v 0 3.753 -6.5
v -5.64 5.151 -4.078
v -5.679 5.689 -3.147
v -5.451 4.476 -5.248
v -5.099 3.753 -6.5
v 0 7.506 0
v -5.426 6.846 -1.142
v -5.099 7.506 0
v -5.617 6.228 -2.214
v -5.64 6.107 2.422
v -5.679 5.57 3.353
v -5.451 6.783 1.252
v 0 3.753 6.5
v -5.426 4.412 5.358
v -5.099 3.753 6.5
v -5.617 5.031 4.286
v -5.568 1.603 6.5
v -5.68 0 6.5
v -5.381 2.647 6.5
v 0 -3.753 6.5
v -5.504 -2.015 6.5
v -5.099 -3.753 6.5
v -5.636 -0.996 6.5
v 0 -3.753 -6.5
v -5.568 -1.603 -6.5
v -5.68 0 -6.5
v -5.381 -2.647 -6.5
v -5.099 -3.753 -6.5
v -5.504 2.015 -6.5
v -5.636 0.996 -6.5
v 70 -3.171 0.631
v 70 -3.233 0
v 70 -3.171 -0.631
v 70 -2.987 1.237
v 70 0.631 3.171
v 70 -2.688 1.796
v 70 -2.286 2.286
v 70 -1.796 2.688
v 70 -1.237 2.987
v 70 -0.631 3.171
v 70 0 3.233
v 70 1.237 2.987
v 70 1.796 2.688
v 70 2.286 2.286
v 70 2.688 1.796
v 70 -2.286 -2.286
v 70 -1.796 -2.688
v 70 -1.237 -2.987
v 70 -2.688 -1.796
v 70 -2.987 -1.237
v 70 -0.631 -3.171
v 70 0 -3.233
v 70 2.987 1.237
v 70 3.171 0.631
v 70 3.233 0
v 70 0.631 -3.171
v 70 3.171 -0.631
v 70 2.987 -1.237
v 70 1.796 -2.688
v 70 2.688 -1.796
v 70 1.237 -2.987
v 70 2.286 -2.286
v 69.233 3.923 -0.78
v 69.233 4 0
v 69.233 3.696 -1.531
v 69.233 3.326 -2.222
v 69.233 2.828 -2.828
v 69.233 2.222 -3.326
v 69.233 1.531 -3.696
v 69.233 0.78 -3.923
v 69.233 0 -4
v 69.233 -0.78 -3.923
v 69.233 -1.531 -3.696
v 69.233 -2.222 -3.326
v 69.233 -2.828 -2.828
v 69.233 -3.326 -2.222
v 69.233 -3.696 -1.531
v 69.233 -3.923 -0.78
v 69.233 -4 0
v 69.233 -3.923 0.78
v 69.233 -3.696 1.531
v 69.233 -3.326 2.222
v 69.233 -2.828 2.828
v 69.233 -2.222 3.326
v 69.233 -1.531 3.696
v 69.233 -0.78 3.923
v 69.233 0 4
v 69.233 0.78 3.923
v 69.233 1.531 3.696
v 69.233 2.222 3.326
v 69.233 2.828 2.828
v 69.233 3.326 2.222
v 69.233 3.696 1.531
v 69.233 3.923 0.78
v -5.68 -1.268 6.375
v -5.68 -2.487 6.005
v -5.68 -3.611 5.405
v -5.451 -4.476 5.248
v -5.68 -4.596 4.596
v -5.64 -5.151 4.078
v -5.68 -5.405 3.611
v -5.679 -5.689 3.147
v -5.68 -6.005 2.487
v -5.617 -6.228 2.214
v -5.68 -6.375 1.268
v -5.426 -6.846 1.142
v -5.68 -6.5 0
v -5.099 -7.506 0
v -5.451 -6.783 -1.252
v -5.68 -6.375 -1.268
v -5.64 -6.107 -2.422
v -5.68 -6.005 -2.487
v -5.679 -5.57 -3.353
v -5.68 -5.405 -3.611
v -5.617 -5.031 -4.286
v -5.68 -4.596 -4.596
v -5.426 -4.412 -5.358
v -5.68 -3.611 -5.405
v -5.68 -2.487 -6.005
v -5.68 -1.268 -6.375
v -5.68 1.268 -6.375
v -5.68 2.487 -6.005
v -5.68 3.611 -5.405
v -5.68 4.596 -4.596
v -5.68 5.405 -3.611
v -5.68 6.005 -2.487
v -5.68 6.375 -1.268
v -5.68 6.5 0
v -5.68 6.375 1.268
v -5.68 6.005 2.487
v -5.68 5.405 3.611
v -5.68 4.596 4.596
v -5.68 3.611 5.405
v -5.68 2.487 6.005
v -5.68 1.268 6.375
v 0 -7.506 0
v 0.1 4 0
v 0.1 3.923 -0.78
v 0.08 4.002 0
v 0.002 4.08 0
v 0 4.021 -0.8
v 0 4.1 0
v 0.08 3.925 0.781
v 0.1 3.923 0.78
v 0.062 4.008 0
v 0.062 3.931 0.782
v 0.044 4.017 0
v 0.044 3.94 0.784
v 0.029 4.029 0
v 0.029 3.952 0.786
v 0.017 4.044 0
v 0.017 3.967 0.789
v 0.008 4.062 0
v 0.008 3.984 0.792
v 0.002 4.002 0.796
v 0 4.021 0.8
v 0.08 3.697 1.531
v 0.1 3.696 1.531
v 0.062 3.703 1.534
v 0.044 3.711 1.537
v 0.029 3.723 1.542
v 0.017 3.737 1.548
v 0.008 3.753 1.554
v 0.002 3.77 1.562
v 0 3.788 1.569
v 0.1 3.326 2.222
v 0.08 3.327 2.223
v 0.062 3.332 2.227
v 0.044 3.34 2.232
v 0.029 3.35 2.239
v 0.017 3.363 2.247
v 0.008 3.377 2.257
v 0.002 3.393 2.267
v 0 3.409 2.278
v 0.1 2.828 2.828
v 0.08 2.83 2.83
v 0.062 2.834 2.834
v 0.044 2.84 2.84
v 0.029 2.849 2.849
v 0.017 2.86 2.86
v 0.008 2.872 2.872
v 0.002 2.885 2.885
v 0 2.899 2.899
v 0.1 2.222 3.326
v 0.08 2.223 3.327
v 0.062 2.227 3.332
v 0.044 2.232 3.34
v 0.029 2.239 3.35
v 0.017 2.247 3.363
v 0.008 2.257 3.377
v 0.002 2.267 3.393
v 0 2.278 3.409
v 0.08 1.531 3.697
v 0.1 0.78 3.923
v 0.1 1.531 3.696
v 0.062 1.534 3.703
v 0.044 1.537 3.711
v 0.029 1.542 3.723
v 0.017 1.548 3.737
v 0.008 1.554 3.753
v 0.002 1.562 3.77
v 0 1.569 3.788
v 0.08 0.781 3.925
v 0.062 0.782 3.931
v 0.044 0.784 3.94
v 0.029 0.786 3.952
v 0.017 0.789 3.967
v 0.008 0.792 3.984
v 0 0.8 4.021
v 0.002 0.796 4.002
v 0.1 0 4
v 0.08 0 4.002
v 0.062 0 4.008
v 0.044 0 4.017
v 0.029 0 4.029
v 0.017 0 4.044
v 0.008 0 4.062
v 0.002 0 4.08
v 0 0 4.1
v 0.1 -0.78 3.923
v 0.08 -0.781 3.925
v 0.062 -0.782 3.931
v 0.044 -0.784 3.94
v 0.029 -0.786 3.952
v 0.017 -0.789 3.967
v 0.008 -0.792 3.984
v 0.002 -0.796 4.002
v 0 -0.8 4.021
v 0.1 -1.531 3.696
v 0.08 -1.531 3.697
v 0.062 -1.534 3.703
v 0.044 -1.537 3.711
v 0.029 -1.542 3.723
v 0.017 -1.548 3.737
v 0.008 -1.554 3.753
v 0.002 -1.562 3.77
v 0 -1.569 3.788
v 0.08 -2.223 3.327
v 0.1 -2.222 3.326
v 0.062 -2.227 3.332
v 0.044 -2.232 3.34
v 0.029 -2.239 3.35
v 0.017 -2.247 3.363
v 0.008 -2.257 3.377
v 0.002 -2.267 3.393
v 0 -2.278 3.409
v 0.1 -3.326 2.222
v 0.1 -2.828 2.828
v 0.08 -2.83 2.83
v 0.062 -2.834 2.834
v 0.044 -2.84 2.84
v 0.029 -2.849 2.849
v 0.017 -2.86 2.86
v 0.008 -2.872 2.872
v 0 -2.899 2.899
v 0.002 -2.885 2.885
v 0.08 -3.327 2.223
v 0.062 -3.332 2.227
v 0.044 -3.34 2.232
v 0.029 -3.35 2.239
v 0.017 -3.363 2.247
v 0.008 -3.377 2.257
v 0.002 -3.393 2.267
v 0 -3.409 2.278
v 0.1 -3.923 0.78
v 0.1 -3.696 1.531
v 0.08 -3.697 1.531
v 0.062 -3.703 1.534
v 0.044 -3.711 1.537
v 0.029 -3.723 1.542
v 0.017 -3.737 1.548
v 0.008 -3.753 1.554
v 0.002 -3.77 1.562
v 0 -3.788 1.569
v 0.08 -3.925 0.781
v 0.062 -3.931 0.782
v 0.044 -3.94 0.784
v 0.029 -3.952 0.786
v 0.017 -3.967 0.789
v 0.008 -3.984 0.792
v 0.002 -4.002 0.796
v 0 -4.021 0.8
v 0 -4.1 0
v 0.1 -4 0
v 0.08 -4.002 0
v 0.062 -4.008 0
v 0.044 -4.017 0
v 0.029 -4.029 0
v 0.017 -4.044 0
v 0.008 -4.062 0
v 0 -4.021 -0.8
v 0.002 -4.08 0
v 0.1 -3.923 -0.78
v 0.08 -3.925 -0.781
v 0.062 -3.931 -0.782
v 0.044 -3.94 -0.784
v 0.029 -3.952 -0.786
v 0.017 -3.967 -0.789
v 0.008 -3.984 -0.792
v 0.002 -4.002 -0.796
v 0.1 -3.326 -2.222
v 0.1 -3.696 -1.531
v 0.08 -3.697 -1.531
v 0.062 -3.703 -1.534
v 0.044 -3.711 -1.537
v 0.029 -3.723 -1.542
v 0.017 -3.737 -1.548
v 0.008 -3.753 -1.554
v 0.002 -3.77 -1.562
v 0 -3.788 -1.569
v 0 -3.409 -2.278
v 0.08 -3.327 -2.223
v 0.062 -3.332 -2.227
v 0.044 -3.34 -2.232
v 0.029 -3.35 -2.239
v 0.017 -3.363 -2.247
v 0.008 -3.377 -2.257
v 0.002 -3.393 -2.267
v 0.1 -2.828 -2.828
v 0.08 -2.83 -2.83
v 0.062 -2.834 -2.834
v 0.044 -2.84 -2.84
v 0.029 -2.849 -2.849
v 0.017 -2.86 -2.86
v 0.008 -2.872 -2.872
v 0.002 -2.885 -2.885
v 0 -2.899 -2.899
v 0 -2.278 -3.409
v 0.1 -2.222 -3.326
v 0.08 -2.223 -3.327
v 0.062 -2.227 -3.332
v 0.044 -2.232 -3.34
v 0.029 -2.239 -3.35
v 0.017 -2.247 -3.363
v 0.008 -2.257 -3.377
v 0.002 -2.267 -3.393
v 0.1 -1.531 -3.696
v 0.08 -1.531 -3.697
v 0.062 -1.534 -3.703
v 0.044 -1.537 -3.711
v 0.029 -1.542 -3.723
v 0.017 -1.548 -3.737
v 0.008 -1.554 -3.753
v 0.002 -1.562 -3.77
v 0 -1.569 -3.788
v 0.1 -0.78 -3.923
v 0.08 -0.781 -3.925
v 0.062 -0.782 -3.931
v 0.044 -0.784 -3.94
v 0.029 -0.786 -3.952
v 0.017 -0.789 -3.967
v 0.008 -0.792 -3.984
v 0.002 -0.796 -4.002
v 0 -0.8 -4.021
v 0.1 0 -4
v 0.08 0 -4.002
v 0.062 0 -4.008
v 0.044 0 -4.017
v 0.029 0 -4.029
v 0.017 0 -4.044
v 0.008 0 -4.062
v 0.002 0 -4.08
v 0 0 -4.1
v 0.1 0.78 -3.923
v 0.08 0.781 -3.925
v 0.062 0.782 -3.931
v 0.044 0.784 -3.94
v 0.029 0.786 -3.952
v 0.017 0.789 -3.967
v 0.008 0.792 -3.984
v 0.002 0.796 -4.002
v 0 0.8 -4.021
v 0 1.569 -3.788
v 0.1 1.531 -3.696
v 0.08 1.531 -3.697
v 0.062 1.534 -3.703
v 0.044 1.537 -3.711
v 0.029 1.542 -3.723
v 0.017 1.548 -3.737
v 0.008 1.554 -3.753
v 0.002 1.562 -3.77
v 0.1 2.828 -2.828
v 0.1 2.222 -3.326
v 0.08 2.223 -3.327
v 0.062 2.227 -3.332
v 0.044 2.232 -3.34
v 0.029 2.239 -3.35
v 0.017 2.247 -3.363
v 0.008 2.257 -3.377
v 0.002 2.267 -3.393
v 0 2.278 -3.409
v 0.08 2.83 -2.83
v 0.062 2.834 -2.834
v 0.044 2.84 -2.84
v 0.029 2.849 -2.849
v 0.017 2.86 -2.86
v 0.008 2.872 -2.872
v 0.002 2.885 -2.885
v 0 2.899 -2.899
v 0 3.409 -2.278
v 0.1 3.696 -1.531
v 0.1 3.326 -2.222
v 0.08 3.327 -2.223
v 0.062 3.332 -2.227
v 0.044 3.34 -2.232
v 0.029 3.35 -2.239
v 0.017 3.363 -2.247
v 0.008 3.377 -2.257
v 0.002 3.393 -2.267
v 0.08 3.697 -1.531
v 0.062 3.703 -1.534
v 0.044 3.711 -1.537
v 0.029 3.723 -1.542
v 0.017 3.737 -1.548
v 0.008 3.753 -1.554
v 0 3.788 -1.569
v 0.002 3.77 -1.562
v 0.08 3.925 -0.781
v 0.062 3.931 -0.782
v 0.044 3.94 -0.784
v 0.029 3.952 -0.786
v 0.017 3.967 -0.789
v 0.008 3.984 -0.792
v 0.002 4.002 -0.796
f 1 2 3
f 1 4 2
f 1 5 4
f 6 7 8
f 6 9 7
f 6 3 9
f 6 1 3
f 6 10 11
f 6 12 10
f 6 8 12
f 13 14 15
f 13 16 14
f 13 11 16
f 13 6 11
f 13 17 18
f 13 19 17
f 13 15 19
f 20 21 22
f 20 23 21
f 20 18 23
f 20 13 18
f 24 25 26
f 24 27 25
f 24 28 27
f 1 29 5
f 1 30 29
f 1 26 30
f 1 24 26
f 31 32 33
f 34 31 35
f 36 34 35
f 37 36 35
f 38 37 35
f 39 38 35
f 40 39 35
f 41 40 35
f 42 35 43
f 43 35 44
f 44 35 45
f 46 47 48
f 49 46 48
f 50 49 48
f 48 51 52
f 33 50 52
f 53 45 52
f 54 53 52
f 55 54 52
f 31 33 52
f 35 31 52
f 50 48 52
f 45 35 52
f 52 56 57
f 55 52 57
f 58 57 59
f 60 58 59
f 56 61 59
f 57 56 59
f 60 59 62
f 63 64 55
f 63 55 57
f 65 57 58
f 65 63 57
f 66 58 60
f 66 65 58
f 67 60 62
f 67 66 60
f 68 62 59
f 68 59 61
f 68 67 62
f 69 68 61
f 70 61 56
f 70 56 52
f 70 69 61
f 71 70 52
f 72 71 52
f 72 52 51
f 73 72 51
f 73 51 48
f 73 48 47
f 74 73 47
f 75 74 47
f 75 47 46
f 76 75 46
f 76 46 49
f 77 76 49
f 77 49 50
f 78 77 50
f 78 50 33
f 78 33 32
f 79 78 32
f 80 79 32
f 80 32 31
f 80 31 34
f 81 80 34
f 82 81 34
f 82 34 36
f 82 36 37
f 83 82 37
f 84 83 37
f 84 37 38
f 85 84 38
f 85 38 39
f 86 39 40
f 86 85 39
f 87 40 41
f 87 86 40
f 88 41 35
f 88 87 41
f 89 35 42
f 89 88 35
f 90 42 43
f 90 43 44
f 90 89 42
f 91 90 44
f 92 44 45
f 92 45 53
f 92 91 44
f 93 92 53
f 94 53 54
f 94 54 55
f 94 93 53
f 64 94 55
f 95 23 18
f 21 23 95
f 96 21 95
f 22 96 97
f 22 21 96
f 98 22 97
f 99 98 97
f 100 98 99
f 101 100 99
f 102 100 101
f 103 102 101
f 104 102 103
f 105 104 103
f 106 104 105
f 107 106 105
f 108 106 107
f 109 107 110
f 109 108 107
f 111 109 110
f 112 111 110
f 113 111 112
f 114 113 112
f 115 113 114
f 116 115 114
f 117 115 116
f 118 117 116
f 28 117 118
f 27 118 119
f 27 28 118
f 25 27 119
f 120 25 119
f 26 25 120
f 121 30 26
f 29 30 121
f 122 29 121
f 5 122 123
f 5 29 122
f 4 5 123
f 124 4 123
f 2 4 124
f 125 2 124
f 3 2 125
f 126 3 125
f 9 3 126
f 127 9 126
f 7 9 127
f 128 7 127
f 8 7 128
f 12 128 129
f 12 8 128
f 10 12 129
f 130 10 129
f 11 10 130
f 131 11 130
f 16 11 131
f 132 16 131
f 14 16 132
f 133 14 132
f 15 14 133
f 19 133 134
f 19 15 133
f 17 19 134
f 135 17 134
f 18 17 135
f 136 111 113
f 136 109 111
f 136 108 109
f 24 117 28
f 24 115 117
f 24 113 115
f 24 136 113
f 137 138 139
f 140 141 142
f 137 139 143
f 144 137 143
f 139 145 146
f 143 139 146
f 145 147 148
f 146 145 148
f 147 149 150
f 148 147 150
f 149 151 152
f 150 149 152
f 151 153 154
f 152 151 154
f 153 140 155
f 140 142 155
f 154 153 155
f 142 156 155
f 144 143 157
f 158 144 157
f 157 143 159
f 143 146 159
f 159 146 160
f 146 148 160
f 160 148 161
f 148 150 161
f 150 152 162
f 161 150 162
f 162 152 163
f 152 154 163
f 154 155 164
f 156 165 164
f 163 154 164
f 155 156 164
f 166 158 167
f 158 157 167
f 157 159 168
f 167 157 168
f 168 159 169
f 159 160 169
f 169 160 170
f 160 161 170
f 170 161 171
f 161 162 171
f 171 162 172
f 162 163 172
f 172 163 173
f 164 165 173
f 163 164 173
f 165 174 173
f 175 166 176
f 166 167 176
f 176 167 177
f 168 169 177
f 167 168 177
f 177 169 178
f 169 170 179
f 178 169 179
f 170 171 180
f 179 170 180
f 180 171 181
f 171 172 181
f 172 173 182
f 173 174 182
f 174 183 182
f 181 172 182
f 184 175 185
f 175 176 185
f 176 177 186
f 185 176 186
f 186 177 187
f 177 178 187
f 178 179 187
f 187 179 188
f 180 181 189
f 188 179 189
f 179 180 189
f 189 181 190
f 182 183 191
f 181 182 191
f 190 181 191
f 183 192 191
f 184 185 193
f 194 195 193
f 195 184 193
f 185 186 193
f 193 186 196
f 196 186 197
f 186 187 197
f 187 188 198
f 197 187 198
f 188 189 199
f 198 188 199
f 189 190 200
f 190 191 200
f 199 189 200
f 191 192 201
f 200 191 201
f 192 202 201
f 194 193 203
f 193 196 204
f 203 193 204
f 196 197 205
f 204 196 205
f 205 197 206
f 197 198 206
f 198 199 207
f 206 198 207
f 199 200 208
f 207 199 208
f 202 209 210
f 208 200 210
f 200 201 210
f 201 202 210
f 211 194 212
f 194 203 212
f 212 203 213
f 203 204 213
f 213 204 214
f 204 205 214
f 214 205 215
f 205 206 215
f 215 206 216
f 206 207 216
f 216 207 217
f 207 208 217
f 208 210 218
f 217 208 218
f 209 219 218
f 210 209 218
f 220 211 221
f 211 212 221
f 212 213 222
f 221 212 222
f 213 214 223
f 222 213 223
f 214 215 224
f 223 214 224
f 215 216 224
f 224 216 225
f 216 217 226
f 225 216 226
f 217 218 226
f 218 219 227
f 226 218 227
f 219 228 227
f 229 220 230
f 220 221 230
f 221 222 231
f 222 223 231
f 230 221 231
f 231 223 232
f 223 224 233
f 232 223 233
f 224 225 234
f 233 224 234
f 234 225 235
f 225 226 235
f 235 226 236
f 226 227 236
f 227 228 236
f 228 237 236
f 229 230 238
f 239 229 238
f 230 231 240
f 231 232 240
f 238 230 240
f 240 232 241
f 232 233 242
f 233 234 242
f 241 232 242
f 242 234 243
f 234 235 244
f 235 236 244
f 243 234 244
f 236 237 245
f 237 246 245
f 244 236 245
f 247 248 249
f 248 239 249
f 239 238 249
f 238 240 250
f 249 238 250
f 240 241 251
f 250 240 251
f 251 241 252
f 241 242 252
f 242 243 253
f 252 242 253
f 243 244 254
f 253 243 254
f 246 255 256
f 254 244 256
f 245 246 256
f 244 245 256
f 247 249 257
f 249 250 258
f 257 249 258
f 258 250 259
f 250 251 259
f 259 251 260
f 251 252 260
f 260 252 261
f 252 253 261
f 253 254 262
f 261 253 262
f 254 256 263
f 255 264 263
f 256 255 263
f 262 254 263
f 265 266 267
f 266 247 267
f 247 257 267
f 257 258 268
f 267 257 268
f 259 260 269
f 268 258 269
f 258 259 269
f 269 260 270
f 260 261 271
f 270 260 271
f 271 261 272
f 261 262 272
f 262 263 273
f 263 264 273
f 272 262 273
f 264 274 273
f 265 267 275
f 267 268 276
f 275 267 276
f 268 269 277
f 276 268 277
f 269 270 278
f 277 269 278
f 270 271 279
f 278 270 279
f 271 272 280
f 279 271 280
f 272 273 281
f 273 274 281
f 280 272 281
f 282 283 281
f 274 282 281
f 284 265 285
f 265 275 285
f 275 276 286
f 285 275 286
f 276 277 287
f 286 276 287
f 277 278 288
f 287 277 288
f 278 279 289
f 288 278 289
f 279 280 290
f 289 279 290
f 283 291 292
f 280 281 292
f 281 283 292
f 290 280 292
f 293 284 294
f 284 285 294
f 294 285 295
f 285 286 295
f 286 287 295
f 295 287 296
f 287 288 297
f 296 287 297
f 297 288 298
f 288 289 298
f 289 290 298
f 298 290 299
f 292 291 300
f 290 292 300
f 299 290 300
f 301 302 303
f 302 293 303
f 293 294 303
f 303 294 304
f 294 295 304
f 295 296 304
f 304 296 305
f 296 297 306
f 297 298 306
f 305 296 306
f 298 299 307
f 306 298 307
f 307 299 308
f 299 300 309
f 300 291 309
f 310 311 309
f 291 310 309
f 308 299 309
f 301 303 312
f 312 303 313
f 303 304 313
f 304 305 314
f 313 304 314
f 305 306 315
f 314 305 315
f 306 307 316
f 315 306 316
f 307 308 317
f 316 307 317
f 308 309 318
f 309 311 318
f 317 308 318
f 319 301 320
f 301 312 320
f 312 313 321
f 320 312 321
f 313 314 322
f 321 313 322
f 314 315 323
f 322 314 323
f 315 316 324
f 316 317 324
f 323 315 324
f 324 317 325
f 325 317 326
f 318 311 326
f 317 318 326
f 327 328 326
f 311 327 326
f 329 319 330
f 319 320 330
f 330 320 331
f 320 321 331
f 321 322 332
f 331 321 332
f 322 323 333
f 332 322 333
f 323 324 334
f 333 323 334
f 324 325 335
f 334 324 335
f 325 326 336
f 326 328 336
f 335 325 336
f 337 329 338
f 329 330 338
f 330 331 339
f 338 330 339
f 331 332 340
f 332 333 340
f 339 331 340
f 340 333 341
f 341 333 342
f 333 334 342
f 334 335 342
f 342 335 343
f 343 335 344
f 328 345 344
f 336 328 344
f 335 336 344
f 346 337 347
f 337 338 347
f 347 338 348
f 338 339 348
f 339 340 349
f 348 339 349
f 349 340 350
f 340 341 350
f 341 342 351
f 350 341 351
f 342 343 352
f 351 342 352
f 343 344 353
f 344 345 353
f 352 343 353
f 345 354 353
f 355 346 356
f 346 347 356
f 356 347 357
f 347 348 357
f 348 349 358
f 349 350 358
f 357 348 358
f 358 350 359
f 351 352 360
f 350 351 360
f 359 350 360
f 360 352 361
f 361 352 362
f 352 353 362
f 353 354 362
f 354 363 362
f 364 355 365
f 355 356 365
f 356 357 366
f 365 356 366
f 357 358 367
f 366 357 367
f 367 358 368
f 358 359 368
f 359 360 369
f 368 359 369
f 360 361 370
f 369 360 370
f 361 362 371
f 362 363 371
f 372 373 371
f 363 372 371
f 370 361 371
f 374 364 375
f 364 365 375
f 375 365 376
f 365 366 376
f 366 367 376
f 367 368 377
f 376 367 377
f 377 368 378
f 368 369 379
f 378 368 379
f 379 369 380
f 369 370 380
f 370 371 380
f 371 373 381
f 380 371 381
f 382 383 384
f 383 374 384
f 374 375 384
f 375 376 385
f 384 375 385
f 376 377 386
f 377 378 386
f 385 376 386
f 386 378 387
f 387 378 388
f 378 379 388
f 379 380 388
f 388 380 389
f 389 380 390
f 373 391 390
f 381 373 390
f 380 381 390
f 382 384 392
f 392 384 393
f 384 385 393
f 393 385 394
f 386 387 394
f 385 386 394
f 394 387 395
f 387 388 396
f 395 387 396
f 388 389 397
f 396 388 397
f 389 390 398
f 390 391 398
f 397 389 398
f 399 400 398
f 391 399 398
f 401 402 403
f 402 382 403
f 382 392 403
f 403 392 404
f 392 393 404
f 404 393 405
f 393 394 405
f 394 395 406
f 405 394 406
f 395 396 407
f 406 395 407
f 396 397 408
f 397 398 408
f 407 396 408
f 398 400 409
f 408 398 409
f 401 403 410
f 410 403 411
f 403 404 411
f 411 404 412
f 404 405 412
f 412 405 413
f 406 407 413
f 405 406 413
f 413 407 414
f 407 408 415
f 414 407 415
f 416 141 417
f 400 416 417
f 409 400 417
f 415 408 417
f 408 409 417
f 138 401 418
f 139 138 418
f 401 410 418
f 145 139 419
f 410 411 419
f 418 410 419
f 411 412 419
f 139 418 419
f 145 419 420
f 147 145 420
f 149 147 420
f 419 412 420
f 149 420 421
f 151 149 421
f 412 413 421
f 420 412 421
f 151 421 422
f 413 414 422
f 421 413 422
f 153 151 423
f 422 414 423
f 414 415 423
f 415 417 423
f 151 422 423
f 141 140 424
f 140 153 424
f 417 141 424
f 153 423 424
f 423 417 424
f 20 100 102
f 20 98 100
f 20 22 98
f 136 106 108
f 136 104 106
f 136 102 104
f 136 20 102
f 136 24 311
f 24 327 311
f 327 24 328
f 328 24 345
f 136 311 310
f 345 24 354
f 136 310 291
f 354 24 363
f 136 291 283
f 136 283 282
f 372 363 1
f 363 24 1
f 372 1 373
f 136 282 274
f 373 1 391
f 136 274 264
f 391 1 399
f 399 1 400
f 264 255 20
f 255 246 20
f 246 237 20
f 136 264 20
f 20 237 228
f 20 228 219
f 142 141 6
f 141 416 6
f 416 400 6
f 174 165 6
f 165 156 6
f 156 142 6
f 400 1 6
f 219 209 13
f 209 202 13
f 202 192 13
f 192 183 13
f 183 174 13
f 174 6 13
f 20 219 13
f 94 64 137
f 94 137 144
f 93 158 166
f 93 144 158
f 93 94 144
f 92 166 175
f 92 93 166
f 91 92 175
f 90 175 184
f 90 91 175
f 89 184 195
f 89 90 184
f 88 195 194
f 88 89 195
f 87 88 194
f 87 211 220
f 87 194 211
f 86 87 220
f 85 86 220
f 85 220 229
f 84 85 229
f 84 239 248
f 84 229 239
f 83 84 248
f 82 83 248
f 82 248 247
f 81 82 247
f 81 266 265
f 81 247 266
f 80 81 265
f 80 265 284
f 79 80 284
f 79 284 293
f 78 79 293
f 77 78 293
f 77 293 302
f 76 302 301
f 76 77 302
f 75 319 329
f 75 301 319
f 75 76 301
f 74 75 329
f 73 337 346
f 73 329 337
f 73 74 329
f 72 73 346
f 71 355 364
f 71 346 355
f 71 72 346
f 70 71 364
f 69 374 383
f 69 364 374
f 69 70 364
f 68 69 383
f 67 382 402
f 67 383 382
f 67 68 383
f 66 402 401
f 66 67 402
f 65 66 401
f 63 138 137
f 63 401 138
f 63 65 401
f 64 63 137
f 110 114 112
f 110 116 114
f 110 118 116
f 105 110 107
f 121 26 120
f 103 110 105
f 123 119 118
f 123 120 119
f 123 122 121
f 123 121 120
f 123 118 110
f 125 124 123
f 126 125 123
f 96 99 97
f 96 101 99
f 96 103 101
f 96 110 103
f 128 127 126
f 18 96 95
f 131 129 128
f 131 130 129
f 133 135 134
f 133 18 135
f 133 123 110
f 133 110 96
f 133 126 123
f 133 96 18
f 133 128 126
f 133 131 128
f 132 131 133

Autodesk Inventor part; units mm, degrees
ref_plane "YZ Plane" through (0, 0, 0) normal (1, 0, 0) x (0, 1, 0)
ref_plane "XZ Plane" through (0, 0, 0) normal (0, 1, 0) x (-1, 0, 0)
sketch "Sketch1" plane through (0, 0, 0) normal (0, 0, 1) x (1, 0, 0)
  line L0 (0, 4) -> (70, 4)
  line L1 (70, 4) -> (70, 0)
  line L2 (70, 0) -> (0, 0)
  line L3 (-17, 0) -> (102, 0) projected
  line L4 (0, -0.8) -> (0, 4.8) projected
  line L5 (0, 4) -> (0, 0)
  dimension "d2" = 8
  dimension "d59" = 70
revolve "Body" add sketch "Sketch1" angle 360 about axis through (70, 0, 0) along (-1, 0, 0)
sketch "Sketch2" plane through (0, 0, 0) normal (-1, 0, 0) x (0, 0, 1)
  line L0 (0, 7.5056) -> (6.5, 3.7528)
  line L1 (6.5, 3.7528) -> (6.5, -3.7528)
  line L2 (6.5, -3.7528) -> (0, -7.5056)
  line L3 (0, -7.5056) -> (-6.5, -3.7528)
  line L4 (-6.5, -3.7528) -> (-6.5, 3.7528)
  line L5 (-6.5, 3.7528) -> (0, 7.5056)
  line L6 (-9.1, 0) -> (9.1, 0) projected
  line L7 (0, 10.5078) -> (0, -10.5078) projected
  point P0 (0, 0)
  point P1 (0, 0)
  dimension "d11" = 13
extrude "Head" add sketch "Sketch2" along normal blind 5.68
sketch "Sketch4" plane through (0, 0, 0) normal (0, 0, 1) x (1, 0, 0)
  line L0 (-4.9294, 7.8) -> (-5.68, 6.5)
  line L1 (-1.1, 0) -> (-0.234, 0)
  line L2 (-6.7692, 0) -> (0.8552, 0) projected
  line L3 (-5.68, 7.8) -> (-4.9294, 7.8)
  line L4 (-5.68, 6.5) -> (-5.68, 7.8)
  line L5 (0, 9.36) -> (0, -1.56) projected
  dimension "d65" = 13
  dimension "d67" = 30
  dimension "d68" = 15.6
  dimension "d69" = 5.68
revolve "Chamfer1" cut sketch "Sketch4" angle 360 about axis through (-1.1, 0, 0) along (1, 0, 0)
thread "Thread" size "M8x1.25" class "6g" standard "ISO Metric profile" length 22
chamfer "Chamfer2" distance 0.7668 distance2 0.7669 1 edges at (70, -4, 0) measured on face at (70, 1.3909, 1.1742)
fillet "Fillet" radius 0.1 1 edges at (0, -4, 0)
ref_plane "Work Plane1" through (1.525, 0, 0) normal (0, 0, 1) x (1, 0, 0)
equation "\"d2\" = GD"
equation "\"d59\" = NLG"
equation "\"d11\" = SW"
equation "\"d3\" = KOH"
equation "\"d15\" = GEL"
equation "\"d6\" = -0.5 * SPD + 0.5 * GD"
equation "\"d71\" = RR"
equation "\"d65\" = SW"
equation "\"d67\" = ANG1"
equation "\"d68\" = 1.2 * SW"
equation "\"d69\" = KOH"
equation "\"NLG\" = 70"
equation "\"GD\" = NND"
equation "\"BDM\" = NND"
equation "\"KOH\" = 5.68"
equation "\"GEL\" = 22"
equation "\"SW\" = 13"
equation "\"SW0\" = SW"
equation "\"SPD\" = NND - 1.2269 * PTC"
equation "\"SD2\" = NND"
equation "\"SD\" = 0"
equation "\"ANG1\" = 30deg"
equation "\"GAL\" = 0.61345 * PTC"
equation "\"GUL\" = 0.61345 * PTC"
equation "\"RR\" = 0.1"
equation "\"RR1\" = 0.4"
equation "\"GD1\" = THREADDIA - 1.2269 * PTC"
equation "\"THREADDIA\" = 8"
equation "\"TOA\" = 30deg"
equation "\"PTC\" = 1.25"
equation "\"KOH1\" = 3.7"
equation "\"NND\" = 8"
equation "\"E0\" = 1.155 * SW"
properties part number "ANSI B18.2.3.5M - M8 x 1.25 x 70" material "Steel, Mild"
